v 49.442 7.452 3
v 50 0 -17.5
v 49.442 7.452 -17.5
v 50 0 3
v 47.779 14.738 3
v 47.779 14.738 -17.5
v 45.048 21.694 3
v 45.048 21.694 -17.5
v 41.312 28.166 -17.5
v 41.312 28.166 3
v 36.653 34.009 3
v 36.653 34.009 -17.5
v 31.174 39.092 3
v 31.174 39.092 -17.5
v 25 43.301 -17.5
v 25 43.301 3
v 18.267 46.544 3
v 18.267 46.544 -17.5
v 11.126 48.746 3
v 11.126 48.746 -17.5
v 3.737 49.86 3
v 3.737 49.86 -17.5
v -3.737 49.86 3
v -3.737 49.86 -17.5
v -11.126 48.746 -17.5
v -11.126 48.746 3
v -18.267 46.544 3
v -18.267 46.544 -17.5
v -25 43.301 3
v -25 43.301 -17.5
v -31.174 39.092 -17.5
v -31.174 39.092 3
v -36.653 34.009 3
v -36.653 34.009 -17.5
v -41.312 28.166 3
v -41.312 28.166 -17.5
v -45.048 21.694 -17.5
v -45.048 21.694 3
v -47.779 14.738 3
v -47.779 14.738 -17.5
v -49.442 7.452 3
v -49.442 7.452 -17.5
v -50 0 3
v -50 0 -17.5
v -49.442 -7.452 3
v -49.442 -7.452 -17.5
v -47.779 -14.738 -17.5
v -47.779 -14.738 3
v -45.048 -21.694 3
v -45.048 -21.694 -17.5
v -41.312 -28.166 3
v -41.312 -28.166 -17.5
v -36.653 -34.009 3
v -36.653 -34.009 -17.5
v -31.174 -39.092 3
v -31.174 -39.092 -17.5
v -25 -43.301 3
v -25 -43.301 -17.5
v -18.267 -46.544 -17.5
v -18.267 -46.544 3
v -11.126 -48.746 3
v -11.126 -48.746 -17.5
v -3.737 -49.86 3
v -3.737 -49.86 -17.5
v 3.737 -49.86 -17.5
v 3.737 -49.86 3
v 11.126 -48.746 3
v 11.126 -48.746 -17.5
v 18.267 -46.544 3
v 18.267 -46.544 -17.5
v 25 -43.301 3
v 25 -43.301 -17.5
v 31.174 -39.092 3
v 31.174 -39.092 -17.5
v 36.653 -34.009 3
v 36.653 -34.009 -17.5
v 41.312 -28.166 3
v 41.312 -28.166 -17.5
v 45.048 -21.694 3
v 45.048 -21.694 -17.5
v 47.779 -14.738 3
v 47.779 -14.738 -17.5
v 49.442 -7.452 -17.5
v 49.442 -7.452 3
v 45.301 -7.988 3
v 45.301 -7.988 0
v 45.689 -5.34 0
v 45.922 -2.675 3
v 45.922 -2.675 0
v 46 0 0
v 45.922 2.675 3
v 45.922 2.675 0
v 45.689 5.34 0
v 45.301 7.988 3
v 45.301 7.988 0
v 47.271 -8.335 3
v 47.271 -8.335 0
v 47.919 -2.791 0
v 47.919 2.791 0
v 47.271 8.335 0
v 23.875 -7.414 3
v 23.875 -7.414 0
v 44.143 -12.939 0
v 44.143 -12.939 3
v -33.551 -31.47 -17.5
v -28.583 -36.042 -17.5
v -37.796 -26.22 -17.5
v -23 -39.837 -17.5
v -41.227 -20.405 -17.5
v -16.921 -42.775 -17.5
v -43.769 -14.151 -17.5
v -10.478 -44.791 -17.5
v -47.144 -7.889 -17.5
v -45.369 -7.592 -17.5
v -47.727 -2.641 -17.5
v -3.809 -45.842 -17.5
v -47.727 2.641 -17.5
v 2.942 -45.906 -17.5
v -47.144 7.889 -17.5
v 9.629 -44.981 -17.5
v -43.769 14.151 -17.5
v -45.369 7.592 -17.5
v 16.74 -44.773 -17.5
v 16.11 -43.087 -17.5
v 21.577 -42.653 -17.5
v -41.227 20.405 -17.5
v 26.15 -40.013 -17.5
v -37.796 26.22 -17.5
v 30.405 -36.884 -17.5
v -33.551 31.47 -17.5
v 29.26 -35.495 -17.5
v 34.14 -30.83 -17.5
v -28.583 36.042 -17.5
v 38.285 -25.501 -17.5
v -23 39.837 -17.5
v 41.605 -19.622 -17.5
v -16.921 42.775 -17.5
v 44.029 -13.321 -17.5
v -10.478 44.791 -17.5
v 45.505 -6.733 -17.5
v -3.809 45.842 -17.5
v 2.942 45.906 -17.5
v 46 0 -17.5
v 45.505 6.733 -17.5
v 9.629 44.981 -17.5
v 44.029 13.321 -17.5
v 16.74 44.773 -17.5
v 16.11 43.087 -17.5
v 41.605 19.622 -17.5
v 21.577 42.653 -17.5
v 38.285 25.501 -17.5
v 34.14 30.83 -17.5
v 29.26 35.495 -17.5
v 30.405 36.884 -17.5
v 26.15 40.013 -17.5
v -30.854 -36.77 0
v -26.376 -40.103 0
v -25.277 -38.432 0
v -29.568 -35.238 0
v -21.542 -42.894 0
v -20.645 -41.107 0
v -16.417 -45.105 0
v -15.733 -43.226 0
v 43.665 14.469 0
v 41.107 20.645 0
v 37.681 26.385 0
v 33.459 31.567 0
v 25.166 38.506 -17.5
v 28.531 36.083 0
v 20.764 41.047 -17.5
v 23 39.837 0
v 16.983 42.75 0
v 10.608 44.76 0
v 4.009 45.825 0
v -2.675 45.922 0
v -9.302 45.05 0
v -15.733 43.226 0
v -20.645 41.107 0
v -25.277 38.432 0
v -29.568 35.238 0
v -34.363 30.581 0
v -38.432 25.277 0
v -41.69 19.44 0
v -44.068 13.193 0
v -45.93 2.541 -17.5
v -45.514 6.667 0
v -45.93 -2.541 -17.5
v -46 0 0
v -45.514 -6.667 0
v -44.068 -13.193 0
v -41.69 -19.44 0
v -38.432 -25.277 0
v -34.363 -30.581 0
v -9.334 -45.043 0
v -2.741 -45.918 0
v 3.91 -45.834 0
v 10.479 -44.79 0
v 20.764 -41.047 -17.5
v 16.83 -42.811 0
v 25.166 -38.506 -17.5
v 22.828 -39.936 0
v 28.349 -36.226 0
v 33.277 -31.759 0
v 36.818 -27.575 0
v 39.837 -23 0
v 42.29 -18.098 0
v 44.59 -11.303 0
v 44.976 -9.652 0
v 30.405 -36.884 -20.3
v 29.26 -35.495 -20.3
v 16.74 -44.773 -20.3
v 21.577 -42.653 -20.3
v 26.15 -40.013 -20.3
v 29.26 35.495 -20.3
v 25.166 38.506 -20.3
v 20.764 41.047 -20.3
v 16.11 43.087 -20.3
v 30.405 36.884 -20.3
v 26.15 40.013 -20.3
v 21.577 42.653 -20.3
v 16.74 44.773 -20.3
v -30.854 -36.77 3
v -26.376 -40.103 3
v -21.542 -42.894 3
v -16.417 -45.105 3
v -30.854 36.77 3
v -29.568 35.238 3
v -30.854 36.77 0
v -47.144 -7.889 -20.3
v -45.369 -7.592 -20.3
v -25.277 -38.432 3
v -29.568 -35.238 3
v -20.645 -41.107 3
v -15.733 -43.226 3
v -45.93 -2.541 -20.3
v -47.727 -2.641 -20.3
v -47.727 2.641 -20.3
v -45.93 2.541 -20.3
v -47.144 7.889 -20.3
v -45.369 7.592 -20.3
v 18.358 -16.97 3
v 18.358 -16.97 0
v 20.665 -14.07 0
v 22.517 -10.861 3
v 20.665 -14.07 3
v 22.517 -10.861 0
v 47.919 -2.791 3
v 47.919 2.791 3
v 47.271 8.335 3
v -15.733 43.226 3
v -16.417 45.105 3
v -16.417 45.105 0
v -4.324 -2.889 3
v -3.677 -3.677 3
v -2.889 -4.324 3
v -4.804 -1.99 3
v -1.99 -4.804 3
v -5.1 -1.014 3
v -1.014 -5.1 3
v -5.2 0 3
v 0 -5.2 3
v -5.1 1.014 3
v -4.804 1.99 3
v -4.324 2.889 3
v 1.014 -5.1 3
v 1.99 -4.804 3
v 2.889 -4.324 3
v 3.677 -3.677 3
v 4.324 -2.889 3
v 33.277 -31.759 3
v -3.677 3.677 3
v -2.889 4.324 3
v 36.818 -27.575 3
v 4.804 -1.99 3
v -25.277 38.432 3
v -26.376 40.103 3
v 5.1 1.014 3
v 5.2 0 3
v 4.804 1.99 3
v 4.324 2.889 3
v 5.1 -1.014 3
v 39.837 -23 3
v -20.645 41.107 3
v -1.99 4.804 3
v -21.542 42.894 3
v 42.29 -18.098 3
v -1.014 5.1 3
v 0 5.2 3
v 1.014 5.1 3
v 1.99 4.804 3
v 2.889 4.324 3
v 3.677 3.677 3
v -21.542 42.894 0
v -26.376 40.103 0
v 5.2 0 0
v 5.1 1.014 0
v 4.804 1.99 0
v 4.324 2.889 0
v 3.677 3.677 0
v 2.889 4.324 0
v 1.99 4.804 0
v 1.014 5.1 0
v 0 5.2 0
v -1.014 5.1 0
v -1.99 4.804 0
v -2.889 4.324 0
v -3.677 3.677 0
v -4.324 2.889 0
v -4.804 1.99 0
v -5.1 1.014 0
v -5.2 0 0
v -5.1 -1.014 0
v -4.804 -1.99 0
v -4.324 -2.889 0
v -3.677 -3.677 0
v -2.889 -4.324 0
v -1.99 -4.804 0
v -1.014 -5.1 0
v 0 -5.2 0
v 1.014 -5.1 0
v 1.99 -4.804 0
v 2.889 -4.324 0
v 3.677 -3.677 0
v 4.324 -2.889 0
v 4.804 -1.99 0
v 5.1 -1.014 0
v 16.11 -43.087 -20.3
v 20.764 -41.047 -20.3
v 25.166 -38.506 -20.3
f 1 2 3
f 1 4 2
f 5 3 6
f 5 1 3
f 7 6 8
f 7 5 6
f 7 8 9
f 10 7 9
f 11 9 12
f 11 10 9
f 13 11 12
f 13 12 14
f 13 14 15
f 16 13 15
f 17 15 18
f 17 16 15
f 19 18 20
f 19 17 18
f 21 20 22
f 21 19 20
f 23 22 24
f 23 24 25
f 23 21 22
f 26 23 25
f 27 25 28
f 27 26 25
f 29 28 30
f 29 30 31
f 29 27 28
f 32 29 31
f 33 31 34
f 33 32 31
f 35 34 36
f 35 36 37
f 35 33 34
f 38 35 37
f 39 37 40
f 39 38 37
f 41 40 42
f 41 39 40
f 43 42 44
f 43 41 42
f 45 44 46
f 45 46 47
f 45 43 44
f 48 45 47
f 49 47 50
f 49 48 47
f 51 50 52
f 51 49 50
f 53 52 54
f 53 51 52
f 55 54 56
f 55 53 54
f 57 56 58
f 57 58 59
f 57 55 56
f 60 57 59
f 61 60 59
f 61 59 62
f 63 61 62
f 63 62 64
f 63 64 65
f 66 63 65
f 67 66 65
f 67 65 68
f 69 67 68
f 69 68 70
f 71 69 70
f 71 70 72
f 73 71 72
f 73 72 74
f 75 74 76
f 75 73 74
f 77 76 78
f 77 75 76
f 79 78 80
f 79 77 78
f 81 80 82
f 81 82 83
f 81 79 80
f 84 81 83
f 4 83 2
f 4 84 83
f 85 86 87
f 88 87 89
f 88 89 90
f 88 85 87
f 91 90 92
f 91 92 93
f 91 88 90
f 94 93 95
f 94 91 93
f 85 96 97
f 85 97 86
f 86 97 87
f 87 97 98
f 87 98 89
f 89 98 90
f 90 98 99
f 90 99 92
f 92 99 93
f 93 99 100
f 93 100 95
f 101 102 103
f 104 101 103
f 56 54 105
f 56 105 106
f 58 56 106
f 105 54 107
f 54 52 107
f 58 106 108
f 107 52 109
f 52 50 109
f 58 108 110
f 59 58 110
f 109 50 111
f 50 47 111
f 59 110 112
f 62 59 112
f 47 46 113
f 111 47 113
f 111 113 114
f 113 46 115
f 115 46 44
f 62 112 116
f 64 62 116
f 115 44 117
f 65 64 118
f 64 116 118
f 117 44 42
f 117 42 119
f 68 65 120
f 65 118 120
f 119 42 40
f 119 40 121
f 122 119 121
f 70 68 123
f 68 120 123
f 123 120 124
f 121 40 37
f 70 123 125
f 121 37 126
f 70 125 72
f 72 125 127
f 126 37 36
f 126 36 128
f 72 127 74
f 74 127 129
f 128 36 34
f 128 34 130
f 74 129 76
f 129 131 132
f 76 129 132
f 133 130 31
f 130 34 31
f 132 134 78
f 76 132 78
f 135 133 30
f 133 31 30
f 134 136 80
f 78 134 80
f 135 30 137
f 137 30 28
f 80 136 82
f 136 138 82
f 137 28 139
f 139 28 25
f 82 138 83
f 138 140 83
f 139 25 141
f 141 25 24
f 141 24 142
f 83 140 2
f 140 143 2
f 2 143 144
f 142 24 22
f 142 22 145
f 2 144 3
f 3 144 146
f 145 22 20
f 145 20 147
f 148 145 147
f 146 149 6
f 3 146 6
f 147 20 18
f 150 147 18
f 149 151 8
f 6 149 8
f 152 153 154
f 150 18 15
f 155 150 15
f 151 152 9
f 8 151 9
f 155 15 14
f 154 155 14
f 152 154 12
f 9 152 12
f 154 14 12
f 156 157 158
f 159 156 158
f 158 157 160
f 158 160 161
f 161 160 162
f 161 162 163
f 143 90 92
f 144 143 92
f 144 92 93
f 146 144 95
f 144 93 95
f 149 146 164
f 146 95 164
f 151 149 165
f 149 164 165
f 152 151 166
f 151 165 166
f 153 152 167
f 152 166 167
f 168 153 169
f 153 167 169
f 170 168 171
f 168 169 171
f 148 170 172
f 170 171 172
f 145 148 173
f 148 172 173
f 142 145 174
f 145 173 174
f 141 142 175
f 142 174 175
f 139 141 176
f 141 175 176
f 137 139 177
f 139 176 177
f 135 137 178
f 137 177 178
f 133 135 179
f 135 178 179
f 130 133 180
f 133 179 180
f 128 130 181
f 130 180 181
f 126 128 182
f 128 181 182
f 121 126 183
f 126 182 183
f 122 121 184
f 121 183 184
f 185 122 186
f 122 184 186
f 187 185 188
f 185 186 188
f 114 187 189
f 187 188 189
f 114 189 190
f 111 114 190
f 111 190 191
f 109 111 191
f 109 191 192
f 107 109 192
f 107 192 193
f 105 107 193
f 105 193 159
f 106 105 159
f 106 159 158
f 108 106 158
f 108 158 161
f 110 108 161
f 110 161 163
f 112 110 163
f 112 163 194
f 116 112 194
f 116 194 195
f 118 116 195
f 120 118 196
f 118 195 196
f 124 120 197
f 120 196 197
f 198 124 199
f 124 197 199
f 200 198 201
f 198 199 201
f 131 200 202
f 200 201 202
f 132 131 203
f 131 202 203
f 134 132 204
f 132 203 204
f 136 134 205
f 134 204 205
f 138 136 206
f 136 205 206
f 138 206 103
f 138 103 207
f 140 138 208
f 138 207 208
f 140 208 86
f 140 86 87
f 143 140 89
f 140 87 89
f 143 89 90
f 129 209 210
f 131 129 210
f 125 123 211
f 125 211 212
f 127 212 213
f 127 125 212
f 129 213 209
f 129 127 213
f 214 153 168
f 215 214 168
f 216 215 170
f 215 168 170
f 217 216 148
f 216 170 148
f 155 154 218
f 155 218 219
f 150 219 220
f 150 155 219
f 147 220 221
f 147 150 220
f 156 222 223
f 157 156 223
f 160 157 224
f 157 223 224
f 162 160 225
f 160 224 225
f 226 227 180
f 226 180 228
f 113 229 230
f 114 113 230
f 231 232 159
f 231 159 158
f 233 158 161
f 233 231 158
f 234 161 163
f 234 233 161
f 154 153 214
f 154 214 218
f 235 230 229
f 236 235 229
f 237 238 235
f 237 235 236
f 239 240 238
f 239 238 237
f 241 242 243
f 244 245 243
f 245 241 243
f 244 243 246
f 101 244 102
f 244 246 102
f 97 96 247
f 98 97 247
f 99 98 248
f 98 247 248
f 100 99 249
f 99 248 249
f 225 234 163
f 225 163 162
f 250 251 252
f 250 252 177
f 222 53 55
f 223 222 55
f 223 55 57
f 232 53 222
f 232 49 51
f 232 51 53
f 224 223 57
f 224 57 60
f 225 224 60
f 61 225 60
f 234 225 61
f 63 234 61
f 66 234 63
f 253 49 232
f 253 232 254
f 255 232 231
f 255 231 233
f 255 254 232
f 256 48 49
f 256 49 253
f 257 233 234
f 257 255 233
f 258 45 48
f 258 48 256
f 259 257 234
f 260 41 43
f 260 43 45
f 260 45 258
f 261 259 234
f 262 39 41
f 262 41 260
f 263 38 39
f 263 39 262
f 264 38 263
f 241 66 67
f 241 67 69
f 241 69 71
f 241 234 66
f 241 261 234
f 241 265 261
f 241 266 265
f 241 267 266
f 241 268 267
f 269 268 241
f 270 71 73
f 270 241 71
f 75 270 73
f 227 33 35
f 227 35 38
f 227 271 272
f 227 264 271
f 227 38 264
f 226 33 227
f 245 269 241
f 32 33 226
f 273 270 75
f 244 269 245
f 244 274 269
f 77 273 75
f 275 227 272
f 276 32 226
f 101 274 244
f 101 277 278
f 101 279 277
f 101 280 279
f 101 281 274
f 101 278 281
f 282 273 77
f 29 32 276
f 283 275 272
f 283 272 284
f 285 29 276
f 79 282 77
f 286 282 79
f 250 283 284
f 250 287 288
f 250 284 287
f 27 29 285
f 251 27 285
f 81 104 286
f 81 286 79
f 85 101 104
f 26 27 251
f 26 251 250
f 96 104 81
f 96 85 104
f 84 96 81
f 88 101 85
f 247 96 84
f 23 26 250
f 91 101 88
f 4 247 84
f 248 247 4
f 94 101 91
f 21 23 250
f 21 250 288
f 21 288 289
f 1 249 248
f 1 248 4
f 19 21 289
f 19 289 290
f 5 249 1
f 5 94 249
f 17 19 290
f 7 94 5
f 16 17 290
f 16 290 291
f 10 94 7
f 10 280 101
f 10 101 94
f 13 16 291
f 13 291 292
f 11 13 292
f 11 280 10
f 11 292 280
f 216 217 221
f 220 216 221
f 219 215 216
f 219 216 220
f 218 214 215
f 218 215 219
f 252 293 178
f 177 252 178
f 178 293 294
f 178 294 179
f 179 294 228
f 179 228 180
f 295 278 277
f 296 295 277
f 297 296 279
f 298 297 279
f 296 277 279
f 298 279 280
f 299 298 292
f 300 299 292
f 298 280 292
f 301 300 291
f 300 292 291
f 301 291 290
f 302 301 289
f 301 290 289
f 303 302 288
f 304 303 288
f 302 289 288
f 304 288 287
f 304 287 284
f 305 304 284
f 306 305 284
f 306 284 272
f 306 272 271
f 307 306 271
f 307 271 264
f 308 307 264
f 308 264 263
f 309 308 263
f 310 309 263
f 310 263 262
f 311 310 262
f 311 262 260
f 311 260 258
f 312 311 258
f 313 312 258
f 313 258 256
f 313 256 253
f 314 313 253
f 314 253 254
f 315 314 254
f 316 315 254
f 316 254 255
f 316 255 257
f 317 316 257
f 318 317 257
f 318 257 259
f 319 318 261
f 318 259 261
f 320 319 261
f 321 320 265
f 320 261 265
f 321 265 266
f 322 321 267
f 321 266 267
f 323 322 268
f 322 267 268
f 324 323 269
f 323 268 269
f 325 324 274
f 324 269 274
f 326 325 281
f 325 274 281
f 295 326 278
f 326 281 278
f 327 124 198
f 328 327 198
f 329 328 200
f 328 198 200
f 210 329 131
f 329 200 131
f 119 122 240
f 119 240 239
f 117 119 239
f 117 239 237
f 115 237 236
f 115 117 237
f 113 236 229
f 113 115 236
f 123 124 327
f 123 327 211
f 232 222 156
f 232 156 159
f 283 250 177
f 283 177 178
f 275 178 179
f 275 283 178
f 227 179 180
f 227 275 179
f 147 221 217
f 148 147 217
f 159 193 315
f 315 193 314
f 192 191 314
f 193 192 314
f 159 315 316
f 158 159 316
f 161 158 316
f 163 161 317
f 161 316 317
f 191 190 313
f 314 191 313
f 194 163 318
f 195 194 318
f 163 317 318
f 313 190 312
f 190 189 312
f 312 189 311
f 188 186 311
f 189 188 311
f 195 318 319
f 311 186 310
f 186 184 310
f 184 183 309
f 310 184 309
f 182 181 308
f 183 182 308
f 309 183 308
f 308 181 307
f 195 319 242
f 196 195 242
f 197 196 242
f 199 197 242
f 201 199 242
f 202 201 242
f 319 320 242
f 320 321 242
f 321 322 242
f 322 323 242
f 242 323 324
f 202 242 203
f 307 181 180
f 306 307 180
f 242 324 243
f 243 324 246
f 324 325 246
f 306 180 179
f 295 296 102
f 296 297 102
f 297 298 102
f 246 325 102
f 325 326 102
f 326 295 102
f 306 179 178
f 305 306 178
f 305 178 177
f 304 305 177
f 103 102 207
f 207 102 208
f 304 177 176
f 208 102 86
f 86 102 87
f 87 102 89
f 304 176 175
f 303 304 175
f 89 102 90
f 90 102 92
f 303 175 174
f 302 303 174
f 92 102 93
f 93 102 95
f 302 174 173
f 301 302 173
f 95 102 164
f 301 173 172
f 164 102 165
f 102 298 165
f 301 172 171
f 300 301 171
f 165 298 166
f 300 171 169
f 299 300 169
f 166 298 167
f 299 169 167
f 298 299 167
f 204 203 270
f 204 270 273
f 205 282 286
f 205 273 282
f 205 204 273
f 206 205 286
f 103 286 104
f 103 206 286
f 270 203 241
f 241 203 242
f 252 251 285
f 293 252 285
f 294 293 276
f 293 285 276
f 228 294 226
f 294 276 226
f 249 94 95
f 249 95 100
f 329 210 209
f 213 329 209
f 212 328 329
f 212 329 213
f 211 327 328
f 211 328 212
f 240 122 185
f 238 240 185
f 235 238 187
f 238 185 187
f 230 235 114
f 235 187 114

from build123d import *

# Parameters (mm, degrees)
SKETCH_R              = 50
PAD_DEPTH             = 3
SKETCH004_R           = 5.2
POCKET001_DEPTH       = 3.001
POCKET002_DEPTH       = 3.001
SKETCH006_R           = 50
SKETCH006_R_2         = 46
PAD001_DEPTH          = 17.5
POCKET003_DEPTH       = 3
POLARPATTERN001_COUNT = 3
PAD002_DEPTH          = 2.8
POLARPATTERN002_COUNT = 3


with BuildPart() as part:
    # Sketch → Pad (new body)
    with BuildSketch(Plane.XY):
        Circle(SKETCH_R)
    extrude(amount=PAD_DEPTH)

    # Sketch004 (on DatumPlane) → Pocket001 (cut, through all)
    with BuildSketch(Plane.XY.offset(3)):
        Circle(SKETCH004_R)
    extrude(amount=-POCKET001_DEPTH, mode=Mode.SUBTRACT)

    # Sketch005 → Pocket002 (cut, through all)
    with BuildSketch(Plane.XY):
        with BuildLine():
            ThreePointArc((33.2768944622, -31.7592237776), (39.8371685741, -23), (44.1427418269, -12.9390240745))
            Line((23.8754986114, -7.4135393744), (44.1427418269, -12.9390240745))
            ThreePointArc((18.3580627359, -16.9700186383), (21.6506350946, -12.5), (23.8754986114, -7.4135393744))
            Line((33.2768944622, -31.7592237776), (18.3580627359, -16.9700186383))
        make_face()
    extrude(amount=POCKET002_DEPTH, mode=Mode.SUBTRACT)

    # Sketch006 → Pad001 (join)
    with BuildSketch(Plane.XY):
        Circle(SKETCH006_R)
        Circle(SKETCH006_R_2, mode=Mode.SUBTRACT)
    extrude(amount=-PAD001_DEPTH)

    # Sketch007 (on DatumPlane) → Pocket003 (cut)
    with BuildSketch(Plane.XY.offset(3)):
        with BuildLine():
            ThreePointArc((45.3011566386, -7.9878161727), (46, 0), (45.3011566386, 7.9878161727))
            Line((45.3011566386, 7.9878161727), (47.2707721446, 8.335112528))
            ThreePointArc((47.2707721446, -8.335112528), (48, 0), (47.2707721446, 8.335112528))
            Line((47.2707721446, -8.335112528), (45.3011566386, -7.9878161727))
        make_face()
    pocket003 = extrude(amount=-POCKET003_DEPTH, mode=Mode.SUBTRACT)

    # PolarPattern001: Pocket003 ×3 about axis
    polarpattern001_axis = Axis((0, 0, 3), (0, 0, 1))
    for i in range(1, POLARPATTERN001_COUNT):
        add(pocket003.rotate(polarpattern001_axis, i * 360 / POLARPATTERN001_COUNT), mode=Mode.SUBTRACT)

    # Sketch008 (on DatumPlane) → Pad002 (join)
    with BuildSketch(Plane.XY.offset(-17.5)):
        with BuildLine():
            ThreePointArc((-45.3691376707, 7.5921898696), (-46, 0), (-45.3691376707, -7.5921898696))
            Line((-47.1444517535, -7.8892755601), (-45.3691376707, -7.5921898696))
            ThreePointArc((-47.1444517535, 7.8892755601), (-47.8, 0), (-47.1444517535, -7.8892755601))
            Line((-45.3691376707, 7.5921898696), (-47.1444517535, 7.8892755601))
        make_face()
    pad002 = extrude(amount=-PAD002_DEPTH)

    # PolarPattern002: Pad002 ×3 about axis
    polarpattern002_axis = Axis((0, 0, -17.5), (0, 0, 1))
    for i in range(1, POLARPATTERN002_COUNT):
        add(pad002.rotate(polarpattern002_axis, i * 360 / POLARPATTERN002_COUNT))


solid = part.part
